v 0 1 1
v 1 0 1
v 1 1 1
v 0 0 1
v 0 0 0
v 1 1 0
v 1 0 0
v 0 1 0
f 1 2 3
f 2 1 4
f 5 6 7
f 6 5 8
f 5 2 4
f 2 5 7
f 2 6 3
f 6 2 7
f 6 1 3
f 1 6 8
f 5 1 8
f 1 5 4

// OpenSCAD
// A child that asks about itself (through a `$` function the module
// passes down) is an error, not an endless recursion.

module q() {
  $ask = function() child_anchors(0);
  a = $ask();
  children(0);
}
module asks() {
  x = $ask();
  cube(1);
}
q() asks();
